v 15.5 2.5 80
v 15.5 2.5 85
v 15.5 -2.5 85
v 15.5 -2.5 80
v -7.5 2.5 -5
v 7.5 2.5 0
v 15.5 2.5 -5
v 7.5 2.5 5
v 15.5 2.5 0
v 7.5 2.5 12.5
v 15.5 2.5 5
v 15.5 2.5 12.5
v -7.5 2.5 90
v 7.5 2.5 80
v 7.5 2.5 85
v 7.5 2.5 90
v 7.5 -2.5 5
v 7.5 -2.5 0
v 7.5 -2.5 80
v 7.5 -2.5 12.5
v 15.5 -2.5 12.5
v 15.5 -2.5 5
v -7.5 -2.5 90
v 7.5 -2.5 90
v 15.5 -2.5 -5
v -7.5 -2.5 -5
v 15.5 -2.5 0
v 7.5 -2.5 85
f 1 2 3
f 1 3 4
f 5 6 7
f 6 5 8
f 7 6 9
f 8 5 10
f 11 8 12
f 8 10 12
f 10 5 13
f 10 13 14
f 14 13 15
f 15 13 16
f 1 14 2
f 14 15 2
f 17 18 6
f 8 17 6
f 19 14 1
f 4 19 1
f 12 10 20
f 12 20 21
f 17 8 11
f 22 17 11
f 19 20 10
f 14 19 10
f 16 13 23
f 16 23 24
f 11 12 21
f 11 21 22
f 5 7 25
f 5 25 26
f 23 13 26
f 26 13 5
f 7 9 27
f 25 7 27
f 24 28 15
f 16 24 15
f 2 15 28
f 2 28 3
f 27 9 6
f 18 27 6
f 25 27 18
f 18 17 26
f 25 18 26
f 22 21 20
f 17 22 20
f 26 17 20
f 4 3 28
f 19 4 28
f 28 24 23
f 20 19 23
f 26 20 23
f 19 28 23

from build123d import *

# Parameters (mm, degrees)
CROQUIS1_W              = 15
CROQUIS1_H              = 5
SALIENTE_EXTRUIR1_DEPTH = 90
SALIENTE_EXTRUIR2_DEPTH = 5
CROQUIS3_W              = 23
CROQUIS3_H              = 7.5
CROQUIS3_H_2            = 5
SALIENTE_EXTRUIR3_DEPTH = 5


with BuildPart() as part:
    # Croquis1 → Saliente-Extruir1 (new body)
    with BuildSketch(Plane.XY):
        Rectangle(CROQUIS1_W, CROQUIS1_H)
    extrude(amount=SALIENTE_EXTRUIR1_DEPTH)

    # Croquis2 → Saliente-Extruir2 (add)
    with BuildSketch(Plane(origin=(0, 0, 0), x_dir=(-1, 0, 0), z_dir=(0, 0, -1))):
        Polygon((-7.5, 2.5), (-15.5, 2.5), (-15.5, -2.5), (-7.5, -2.5), (7.5, -2.5), (7.5, 2.5), align=None)
    extrude(amount=SALIENTE_EXTRUIR2_DEPTH)

    # Croquis3 → Saliente-Extruir3 (add)
    with BuildSketch(Plane(origin=(0, 2.5, 0), x_dir=(1, 0, 0), z_dir=(0, 1, 0))):
        with Locations((4, -8.75)):
            Rectangle(CROQUIS3_W, CROQUIS3_H)
        with Locations((4, -82.5)):
            Rectangle(CROQUIS3_W, CROQUIS3_H_2)
    extrude(amount=-SALIENTE_EXTRUIR3_DEPTH)


solid = part.part
